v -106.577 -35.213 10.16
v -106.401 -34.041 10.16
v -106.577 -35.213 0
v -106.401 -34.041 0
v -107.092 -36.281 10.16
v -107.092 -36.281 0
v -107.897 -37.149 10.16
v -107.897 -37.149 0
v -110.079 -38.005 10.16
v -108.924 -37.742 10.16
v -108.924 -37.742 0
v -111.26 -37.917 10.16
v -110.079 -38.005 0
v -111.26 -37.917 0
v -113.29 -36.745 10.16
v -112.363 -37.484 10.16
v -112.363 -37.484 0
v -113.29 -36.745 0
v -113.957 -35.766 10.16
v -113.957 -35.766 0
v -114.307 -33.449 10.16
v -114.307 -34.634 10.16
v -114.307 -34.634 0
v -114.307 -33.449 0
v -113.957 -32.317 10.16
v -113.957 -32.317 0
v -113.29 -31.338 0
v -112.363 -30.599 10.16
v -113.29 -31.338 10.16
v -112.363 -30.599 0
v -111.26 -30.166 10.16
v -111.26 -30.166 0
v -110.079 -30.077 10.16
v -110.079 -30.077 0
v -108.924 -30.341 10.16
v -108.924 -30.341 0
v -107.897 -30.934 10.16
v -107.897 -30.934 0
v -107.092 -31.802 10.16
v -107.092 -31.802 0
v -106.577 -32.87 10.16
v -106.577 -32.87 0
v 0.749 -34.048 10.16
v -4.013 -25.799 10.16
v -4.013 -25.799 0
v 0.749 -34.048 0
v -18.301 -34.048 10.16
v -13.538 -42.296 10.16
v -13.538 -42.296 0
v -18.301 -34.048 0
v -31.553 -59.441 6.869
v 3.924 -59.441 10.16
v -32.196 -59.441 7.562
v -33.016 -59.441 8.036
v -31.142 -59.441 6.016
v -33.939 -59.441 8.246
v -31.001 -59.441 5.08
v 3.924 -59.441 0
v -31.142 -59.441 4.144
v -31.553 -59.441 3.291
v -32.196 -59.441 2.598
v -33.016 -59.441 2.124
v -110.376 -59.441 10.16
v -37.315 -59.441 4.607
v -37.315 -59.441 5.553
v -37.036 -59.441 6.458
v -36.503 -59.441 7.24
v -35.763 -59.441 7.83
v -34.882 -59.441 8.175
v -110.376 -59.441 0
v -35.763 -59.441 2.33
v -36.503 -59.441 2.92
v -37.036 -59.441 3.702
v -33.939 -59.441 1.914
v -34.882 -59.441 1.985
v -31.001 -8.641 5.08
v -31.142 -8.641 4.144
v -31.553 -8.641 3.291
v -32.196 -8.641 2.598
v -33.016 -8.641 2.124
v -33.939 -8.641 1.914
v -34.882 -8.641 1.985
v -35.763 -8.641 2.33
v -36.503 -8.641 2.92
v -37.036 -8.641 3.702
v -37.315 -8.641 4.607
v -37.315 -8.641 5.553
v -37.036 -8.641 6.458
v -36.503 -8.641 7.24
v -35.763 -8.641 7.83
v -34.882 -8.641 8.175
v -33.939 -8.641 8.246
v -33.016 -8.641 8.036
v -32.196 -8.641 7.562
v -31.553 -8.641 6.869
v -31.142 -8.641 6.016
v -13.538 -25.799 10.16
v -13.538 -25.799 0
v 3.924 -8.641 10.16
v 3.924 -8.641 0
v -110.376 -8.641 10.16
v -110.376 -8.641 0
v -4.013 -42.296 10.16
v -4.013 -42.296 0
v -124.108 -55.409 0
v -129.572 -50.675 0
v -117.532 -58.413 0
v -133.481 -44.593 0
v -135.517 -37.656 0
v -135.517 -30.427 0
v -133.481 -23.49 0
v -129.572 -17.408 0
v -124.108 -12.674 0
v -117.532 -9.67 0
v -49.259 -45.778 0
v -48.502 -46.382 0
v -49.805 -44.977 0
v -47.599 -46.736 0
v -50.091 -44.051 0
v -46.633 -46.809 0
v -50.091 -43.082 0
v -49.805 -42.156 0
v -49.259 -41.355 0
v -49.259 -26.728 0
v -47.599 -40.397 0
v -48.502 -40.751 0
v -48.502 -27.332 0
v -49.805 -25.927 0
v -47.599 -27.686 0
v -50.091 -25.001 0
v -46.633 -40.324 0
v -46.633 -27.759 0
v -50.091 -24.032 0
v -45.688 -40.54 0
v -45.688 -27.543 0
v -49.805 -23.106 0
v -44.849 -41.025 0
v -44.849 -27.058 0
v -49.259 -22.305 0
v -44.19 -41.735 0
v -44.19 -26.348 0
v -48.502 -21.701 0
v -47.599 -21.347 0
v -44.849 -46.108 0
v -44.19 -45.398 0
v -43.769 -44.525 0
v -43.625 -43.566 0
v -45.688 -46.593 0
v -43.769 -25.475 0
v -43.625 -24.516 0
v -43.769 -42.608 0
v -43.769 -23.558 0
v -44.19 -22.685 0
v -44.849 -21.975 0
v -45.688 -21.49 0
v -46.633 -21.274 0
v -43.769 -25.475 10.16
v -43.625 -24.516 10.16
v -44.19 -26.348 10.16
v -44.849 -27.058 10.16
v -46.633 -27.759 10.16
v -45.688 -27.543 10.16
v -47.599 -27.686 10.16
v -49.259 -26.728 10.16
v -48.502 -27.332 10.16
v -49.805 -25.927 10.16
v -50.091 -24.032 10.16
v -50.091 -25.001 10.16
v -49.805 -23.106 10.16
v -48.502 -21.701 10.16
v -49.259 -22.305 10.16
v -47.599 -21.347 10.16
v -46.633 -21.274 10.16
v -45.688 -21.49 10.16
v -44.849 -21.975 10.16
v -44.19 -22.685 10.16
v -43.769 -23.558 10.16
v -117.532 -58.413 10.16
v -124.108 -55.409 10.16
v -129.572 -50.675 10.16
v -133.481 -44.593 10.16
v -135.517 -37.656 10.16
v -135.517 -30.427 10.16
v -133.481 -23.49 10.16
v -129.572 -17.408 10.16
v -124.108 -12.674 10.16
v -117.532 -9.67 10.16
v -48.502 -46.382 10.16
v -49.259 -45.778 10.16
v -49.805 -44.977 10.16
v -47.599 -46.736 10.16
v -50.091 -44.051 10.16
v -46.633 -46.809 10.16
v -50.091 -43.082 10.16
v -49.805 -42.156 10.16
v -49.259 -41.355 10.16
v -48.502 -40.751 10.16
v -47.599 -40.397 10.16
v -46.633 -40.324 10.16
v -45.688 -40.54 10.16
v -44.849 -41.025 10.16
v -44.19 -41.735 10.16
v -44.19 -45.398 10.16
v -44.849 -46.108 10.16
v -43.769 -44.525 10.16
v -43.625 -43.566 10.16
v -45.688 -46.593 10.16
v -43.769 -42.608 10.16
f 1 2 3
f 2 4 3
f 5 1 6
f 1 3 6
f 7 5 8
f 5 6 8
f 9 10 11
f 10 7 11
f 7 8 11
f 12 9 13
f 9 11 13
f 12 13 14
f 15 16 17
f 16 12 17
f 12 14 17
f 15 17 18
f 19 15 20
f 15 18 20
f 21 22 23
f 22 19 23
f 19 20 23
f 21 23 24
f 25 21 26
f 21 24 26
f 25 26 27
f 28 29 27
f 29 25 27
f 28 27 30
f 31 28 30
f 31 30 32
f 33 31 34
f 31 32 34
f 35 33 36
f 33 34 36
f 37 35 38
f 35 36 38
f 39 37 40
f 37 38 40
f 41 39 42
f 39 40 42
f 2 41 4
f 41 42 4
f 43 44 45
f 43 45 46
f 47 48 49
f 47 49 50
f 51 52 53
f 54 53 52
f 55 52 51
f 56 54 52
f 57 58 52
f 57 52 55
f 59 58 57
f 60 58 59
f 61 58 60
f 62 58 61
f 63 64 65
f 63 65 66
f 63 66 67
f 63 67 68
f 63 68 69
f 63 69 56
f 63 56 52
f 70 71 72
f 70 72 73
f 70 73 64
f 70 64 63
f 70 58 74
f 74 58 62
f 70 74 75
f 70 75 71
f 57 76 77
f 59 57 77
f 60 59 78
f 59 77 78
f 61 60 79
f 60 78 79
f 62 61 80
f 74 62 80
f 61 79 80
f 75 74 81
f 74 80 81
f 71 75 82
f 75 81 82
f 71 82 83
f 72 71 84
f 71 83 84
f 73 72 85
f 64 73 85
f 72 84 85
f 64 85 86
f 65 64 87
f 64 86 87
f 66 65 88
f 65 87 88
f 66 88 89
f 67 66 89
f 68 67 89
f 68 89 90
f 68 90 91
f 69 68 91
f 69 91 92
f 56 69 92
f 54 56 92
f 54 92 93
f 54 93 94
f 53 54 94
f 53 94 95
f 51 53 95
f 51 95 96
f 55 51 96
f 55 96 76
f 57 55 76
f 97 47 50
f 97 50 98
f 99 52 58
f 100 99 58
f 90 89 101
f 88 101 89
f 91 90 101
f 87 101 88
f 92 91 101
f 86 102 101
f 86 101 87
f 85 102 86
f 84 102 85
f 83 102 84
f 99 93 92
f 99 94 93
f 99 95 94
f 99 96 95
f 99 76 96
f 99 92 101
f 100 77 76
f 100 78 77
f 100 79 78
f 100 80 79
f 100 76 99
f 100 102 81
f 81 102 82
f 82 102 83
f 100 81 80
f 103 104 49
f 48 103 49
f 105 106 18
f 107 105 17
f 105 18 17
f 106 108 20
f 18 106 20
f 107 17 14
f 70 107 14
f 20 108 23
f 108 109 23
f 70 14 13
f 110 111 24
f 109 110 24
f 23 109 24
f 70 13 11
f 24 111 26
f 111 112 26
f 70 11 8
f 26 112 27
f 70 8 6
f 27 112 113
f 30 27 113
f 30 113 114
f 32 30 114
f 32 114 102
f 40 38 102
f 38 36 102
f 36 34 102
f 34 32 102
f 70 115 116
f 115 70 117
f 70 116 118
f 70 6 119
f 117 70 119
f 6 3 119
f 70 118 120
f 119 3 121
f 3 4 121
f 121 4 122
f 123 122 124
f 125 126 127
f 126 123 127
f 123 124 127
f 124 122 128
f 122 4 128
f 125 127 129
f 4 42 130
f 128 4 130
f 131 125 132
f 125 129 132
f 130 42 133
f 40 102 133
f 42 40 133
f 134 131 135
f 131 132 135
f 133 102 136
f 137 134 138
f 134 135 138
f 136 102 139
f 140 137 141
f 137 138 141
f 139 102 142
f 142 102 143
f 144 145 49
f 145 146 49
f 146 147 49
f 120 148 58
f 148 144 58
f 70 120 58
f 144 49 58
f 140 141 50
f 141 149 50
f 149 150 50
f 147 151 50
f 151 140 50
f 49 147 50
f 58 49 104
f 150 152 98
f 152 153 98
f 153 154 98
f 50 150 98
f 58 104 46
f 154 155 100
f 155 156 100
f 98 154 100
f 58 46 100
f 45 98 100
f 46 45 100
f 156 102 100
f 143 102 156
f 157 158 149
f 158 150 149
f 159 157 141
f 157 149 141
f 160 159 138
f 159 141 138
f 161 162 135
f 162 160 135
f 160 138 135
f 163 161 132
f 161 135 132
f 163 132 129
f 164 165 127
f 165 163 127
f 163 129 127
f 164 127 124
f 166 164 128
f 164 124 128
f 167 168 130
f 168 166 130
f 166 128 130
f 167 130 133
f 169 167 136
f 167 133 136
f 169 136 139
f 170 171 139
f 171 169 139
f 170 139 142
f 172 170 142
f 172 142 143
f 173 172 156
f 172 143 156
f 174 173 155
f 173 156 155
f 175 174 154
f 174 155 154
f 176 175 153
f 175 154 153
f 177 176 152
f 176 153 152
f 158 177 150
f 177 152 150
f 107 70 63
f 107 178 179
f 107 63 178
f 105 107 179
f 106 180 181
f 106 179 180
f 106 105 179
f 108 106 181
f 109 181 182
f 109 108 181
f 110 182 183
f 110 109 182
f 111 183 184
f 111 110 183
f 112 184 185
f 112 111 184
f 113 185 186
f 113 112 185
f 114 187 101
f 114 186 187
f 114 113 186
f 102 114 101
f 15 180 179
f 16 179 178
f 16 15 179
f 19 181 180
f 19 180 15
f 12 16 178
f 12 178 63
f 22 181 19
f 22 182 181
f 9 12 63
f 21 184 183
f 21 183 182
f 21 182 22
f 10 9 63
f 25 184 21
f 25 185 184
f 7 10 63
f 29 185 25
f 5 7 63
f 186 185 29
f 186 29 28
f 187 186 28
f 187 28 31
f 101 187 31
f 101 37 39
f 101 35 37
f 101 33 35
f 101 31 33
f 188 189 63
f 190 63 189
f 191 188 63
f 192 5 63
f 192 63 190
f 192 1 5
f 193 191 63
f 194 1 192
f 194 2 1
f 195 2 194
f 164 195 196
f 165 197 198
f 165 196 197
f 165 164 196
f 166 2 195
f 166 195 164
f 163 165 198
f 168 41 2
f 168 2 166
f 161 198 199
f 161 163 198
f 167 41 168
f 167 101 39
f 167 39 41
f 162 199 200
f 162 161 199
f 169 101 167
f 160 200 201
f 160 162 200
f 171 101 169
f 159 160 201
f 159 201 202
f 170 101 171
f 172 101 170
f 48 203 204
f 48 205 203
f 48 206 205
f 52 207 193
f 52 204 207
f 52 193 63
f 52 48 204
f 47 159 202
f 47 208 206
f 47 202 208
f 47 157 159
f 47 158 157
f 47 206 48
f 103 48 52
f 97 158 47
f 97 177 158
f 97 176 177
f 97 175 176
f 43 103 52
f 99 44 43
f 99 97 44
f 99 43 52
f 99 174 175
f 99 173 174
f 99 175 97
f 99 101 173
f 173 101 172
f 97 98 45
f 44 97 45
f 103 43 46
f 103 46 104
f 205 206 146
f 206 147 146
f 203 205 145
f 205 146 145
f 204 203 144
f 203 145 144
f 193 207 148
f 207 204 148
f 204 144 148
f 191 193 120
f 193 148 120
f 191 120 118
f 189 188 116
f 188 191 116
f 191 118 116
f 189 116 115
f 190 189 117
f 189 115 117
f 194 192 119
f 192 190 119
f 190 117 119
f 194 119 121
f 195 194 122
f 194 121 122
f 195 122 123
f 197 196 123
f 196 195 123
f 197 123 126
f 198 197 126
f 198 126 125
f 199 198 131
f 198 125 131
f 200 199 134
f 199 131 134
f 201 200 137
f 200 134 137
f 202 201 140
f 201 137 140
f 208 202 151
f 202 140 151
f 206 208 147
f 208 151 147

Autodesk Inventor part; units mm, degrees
ref_plane "YZ Plane" through (0, 0, 0) normal (1, 0, 0) x (0, 1, 0)
ref_plane "XZ Plane" through (0, 0, 0) normal (0, 1, 0) x (-1, 0, 0)
sketch "Sketch1" plane through (0, 0, 0) normal (0, 0, 1) x (1, 0, 0)
  line L0 (-110.3759, -8.6414) -> (42.0241, -8.6414)
  line L1 (42.0241, -8.6414) -> (42.0241, -59.4414)
  line L2 (42.0241, -59.4414) -> (-110.3759, -59.4414)
  circle A0 centre (-46.8759, -24.5164) radius 3.2512
  circle A1 centre (-46.8759, -43.5664) radius 3.2512
  line L3 (-13.5384, -25.7986) -> (-4.0134, -25.7986)
  line L4 (-4.0134, -25.7986) -> (0.7491, -34.0475)
  line L5 (0.7491, -34.0475) -> (-4.0134, -42.2964)
  line L6 (-4.0134, -42.2964) -> (-13.5384, -42.2964)
  line L7 (-13.5384, -42.2964) -> (-18.3009, -34.0475)
  line L8 (-18.3009, -34.0475) -> (-13.5384, -25.7986)
  circle A2 centre (-110.3759, -34.0414) radius 3.9751
  arc A3 (-110.3759, -8.6414) -> (-110.3759, -59.4414) centre (-110.3759, -34.0414) ccw
  point P0 (0, 0)
  point P1 (-8.7759, -34.0414)
  point P2 (-8.7759, -42.2964)
  dimension "d4" = 6.5024
  dimension "d5" = 6.5024
  dimension "d9" = 152.4
  dimension "d10" = 9.525
  dimension "d11" = 9.525
  dimension "d13" = 120
  dimension "d16" = 9.525
  dimension "d17" = 9.525
  dimension "d18" = 120
  dimension "d19" = 9.525
  dimension "d20" = 9.525
  dimension "d21" = 50.8
  dimension "d22" = 8.255
  dimension "d23" = 9.525
  dimension "d25" = 7.9502
  dimension "d27" = 9.525
  dimension "d37" = 19.05
  dimension "d38" = 50.8
  dimension "d39" = 25.4
  dimension "d40" = 63.5
  dimension "d51" = 101.6
extrude "Extrusion1" add sketch "Sketch1" along normal blind 10.16
ref_plane "Work Plane1" through (-110.3759, -8.6414, 0) normal (0, 1, 0) x (1, 0, 0)
sketch "Sketch3" plane through (-110.3759, -8.6414, 0) normal (0, 1, 0) x (1, 0, 0)
  line L0 (50.8, 1.8056) -> (50.8, -17.2484)
  line L1 (152.4, 0) -> (152.4, -10.16) projected
  circle A0 centre (76.2, -5.08) radius 3.175
  point P0 (110.3759, 0)
  point P1 (152.4, -5.08)
  dimension "d46" = 101.6
  dimension "d47" = 6.35
  dimension "d48" = 25.4
extrude "Extrusion2" cut sketch "Sketch3" against normal blind 50.8
sketch "Sketch4" plane through (42.0241, -59.4414, 0) normal (1, 0, 0) x (0, 0, -1)
  line L0 (-10.16, 0) -> (-10.16, 50.8) projected
  line L1 (0, 0) -> (0, 50.8) projected
  line L2 (-10.16, 50.8) -> (0, 50.8)
  line L3 (0, 50.8) -> (0, 0)
  line L4 (0, 0) -> (-10.16, 0)
  line L5 (-10.16, 0) -> (-10.16, 50.8)
  point P0 (0, 59.4414)
  point P1 (-10.16, 0)
extrude "Extrusion3" cut sketch "Sketch4" against normal blind 38.1
properties part number "new plates for arm"
